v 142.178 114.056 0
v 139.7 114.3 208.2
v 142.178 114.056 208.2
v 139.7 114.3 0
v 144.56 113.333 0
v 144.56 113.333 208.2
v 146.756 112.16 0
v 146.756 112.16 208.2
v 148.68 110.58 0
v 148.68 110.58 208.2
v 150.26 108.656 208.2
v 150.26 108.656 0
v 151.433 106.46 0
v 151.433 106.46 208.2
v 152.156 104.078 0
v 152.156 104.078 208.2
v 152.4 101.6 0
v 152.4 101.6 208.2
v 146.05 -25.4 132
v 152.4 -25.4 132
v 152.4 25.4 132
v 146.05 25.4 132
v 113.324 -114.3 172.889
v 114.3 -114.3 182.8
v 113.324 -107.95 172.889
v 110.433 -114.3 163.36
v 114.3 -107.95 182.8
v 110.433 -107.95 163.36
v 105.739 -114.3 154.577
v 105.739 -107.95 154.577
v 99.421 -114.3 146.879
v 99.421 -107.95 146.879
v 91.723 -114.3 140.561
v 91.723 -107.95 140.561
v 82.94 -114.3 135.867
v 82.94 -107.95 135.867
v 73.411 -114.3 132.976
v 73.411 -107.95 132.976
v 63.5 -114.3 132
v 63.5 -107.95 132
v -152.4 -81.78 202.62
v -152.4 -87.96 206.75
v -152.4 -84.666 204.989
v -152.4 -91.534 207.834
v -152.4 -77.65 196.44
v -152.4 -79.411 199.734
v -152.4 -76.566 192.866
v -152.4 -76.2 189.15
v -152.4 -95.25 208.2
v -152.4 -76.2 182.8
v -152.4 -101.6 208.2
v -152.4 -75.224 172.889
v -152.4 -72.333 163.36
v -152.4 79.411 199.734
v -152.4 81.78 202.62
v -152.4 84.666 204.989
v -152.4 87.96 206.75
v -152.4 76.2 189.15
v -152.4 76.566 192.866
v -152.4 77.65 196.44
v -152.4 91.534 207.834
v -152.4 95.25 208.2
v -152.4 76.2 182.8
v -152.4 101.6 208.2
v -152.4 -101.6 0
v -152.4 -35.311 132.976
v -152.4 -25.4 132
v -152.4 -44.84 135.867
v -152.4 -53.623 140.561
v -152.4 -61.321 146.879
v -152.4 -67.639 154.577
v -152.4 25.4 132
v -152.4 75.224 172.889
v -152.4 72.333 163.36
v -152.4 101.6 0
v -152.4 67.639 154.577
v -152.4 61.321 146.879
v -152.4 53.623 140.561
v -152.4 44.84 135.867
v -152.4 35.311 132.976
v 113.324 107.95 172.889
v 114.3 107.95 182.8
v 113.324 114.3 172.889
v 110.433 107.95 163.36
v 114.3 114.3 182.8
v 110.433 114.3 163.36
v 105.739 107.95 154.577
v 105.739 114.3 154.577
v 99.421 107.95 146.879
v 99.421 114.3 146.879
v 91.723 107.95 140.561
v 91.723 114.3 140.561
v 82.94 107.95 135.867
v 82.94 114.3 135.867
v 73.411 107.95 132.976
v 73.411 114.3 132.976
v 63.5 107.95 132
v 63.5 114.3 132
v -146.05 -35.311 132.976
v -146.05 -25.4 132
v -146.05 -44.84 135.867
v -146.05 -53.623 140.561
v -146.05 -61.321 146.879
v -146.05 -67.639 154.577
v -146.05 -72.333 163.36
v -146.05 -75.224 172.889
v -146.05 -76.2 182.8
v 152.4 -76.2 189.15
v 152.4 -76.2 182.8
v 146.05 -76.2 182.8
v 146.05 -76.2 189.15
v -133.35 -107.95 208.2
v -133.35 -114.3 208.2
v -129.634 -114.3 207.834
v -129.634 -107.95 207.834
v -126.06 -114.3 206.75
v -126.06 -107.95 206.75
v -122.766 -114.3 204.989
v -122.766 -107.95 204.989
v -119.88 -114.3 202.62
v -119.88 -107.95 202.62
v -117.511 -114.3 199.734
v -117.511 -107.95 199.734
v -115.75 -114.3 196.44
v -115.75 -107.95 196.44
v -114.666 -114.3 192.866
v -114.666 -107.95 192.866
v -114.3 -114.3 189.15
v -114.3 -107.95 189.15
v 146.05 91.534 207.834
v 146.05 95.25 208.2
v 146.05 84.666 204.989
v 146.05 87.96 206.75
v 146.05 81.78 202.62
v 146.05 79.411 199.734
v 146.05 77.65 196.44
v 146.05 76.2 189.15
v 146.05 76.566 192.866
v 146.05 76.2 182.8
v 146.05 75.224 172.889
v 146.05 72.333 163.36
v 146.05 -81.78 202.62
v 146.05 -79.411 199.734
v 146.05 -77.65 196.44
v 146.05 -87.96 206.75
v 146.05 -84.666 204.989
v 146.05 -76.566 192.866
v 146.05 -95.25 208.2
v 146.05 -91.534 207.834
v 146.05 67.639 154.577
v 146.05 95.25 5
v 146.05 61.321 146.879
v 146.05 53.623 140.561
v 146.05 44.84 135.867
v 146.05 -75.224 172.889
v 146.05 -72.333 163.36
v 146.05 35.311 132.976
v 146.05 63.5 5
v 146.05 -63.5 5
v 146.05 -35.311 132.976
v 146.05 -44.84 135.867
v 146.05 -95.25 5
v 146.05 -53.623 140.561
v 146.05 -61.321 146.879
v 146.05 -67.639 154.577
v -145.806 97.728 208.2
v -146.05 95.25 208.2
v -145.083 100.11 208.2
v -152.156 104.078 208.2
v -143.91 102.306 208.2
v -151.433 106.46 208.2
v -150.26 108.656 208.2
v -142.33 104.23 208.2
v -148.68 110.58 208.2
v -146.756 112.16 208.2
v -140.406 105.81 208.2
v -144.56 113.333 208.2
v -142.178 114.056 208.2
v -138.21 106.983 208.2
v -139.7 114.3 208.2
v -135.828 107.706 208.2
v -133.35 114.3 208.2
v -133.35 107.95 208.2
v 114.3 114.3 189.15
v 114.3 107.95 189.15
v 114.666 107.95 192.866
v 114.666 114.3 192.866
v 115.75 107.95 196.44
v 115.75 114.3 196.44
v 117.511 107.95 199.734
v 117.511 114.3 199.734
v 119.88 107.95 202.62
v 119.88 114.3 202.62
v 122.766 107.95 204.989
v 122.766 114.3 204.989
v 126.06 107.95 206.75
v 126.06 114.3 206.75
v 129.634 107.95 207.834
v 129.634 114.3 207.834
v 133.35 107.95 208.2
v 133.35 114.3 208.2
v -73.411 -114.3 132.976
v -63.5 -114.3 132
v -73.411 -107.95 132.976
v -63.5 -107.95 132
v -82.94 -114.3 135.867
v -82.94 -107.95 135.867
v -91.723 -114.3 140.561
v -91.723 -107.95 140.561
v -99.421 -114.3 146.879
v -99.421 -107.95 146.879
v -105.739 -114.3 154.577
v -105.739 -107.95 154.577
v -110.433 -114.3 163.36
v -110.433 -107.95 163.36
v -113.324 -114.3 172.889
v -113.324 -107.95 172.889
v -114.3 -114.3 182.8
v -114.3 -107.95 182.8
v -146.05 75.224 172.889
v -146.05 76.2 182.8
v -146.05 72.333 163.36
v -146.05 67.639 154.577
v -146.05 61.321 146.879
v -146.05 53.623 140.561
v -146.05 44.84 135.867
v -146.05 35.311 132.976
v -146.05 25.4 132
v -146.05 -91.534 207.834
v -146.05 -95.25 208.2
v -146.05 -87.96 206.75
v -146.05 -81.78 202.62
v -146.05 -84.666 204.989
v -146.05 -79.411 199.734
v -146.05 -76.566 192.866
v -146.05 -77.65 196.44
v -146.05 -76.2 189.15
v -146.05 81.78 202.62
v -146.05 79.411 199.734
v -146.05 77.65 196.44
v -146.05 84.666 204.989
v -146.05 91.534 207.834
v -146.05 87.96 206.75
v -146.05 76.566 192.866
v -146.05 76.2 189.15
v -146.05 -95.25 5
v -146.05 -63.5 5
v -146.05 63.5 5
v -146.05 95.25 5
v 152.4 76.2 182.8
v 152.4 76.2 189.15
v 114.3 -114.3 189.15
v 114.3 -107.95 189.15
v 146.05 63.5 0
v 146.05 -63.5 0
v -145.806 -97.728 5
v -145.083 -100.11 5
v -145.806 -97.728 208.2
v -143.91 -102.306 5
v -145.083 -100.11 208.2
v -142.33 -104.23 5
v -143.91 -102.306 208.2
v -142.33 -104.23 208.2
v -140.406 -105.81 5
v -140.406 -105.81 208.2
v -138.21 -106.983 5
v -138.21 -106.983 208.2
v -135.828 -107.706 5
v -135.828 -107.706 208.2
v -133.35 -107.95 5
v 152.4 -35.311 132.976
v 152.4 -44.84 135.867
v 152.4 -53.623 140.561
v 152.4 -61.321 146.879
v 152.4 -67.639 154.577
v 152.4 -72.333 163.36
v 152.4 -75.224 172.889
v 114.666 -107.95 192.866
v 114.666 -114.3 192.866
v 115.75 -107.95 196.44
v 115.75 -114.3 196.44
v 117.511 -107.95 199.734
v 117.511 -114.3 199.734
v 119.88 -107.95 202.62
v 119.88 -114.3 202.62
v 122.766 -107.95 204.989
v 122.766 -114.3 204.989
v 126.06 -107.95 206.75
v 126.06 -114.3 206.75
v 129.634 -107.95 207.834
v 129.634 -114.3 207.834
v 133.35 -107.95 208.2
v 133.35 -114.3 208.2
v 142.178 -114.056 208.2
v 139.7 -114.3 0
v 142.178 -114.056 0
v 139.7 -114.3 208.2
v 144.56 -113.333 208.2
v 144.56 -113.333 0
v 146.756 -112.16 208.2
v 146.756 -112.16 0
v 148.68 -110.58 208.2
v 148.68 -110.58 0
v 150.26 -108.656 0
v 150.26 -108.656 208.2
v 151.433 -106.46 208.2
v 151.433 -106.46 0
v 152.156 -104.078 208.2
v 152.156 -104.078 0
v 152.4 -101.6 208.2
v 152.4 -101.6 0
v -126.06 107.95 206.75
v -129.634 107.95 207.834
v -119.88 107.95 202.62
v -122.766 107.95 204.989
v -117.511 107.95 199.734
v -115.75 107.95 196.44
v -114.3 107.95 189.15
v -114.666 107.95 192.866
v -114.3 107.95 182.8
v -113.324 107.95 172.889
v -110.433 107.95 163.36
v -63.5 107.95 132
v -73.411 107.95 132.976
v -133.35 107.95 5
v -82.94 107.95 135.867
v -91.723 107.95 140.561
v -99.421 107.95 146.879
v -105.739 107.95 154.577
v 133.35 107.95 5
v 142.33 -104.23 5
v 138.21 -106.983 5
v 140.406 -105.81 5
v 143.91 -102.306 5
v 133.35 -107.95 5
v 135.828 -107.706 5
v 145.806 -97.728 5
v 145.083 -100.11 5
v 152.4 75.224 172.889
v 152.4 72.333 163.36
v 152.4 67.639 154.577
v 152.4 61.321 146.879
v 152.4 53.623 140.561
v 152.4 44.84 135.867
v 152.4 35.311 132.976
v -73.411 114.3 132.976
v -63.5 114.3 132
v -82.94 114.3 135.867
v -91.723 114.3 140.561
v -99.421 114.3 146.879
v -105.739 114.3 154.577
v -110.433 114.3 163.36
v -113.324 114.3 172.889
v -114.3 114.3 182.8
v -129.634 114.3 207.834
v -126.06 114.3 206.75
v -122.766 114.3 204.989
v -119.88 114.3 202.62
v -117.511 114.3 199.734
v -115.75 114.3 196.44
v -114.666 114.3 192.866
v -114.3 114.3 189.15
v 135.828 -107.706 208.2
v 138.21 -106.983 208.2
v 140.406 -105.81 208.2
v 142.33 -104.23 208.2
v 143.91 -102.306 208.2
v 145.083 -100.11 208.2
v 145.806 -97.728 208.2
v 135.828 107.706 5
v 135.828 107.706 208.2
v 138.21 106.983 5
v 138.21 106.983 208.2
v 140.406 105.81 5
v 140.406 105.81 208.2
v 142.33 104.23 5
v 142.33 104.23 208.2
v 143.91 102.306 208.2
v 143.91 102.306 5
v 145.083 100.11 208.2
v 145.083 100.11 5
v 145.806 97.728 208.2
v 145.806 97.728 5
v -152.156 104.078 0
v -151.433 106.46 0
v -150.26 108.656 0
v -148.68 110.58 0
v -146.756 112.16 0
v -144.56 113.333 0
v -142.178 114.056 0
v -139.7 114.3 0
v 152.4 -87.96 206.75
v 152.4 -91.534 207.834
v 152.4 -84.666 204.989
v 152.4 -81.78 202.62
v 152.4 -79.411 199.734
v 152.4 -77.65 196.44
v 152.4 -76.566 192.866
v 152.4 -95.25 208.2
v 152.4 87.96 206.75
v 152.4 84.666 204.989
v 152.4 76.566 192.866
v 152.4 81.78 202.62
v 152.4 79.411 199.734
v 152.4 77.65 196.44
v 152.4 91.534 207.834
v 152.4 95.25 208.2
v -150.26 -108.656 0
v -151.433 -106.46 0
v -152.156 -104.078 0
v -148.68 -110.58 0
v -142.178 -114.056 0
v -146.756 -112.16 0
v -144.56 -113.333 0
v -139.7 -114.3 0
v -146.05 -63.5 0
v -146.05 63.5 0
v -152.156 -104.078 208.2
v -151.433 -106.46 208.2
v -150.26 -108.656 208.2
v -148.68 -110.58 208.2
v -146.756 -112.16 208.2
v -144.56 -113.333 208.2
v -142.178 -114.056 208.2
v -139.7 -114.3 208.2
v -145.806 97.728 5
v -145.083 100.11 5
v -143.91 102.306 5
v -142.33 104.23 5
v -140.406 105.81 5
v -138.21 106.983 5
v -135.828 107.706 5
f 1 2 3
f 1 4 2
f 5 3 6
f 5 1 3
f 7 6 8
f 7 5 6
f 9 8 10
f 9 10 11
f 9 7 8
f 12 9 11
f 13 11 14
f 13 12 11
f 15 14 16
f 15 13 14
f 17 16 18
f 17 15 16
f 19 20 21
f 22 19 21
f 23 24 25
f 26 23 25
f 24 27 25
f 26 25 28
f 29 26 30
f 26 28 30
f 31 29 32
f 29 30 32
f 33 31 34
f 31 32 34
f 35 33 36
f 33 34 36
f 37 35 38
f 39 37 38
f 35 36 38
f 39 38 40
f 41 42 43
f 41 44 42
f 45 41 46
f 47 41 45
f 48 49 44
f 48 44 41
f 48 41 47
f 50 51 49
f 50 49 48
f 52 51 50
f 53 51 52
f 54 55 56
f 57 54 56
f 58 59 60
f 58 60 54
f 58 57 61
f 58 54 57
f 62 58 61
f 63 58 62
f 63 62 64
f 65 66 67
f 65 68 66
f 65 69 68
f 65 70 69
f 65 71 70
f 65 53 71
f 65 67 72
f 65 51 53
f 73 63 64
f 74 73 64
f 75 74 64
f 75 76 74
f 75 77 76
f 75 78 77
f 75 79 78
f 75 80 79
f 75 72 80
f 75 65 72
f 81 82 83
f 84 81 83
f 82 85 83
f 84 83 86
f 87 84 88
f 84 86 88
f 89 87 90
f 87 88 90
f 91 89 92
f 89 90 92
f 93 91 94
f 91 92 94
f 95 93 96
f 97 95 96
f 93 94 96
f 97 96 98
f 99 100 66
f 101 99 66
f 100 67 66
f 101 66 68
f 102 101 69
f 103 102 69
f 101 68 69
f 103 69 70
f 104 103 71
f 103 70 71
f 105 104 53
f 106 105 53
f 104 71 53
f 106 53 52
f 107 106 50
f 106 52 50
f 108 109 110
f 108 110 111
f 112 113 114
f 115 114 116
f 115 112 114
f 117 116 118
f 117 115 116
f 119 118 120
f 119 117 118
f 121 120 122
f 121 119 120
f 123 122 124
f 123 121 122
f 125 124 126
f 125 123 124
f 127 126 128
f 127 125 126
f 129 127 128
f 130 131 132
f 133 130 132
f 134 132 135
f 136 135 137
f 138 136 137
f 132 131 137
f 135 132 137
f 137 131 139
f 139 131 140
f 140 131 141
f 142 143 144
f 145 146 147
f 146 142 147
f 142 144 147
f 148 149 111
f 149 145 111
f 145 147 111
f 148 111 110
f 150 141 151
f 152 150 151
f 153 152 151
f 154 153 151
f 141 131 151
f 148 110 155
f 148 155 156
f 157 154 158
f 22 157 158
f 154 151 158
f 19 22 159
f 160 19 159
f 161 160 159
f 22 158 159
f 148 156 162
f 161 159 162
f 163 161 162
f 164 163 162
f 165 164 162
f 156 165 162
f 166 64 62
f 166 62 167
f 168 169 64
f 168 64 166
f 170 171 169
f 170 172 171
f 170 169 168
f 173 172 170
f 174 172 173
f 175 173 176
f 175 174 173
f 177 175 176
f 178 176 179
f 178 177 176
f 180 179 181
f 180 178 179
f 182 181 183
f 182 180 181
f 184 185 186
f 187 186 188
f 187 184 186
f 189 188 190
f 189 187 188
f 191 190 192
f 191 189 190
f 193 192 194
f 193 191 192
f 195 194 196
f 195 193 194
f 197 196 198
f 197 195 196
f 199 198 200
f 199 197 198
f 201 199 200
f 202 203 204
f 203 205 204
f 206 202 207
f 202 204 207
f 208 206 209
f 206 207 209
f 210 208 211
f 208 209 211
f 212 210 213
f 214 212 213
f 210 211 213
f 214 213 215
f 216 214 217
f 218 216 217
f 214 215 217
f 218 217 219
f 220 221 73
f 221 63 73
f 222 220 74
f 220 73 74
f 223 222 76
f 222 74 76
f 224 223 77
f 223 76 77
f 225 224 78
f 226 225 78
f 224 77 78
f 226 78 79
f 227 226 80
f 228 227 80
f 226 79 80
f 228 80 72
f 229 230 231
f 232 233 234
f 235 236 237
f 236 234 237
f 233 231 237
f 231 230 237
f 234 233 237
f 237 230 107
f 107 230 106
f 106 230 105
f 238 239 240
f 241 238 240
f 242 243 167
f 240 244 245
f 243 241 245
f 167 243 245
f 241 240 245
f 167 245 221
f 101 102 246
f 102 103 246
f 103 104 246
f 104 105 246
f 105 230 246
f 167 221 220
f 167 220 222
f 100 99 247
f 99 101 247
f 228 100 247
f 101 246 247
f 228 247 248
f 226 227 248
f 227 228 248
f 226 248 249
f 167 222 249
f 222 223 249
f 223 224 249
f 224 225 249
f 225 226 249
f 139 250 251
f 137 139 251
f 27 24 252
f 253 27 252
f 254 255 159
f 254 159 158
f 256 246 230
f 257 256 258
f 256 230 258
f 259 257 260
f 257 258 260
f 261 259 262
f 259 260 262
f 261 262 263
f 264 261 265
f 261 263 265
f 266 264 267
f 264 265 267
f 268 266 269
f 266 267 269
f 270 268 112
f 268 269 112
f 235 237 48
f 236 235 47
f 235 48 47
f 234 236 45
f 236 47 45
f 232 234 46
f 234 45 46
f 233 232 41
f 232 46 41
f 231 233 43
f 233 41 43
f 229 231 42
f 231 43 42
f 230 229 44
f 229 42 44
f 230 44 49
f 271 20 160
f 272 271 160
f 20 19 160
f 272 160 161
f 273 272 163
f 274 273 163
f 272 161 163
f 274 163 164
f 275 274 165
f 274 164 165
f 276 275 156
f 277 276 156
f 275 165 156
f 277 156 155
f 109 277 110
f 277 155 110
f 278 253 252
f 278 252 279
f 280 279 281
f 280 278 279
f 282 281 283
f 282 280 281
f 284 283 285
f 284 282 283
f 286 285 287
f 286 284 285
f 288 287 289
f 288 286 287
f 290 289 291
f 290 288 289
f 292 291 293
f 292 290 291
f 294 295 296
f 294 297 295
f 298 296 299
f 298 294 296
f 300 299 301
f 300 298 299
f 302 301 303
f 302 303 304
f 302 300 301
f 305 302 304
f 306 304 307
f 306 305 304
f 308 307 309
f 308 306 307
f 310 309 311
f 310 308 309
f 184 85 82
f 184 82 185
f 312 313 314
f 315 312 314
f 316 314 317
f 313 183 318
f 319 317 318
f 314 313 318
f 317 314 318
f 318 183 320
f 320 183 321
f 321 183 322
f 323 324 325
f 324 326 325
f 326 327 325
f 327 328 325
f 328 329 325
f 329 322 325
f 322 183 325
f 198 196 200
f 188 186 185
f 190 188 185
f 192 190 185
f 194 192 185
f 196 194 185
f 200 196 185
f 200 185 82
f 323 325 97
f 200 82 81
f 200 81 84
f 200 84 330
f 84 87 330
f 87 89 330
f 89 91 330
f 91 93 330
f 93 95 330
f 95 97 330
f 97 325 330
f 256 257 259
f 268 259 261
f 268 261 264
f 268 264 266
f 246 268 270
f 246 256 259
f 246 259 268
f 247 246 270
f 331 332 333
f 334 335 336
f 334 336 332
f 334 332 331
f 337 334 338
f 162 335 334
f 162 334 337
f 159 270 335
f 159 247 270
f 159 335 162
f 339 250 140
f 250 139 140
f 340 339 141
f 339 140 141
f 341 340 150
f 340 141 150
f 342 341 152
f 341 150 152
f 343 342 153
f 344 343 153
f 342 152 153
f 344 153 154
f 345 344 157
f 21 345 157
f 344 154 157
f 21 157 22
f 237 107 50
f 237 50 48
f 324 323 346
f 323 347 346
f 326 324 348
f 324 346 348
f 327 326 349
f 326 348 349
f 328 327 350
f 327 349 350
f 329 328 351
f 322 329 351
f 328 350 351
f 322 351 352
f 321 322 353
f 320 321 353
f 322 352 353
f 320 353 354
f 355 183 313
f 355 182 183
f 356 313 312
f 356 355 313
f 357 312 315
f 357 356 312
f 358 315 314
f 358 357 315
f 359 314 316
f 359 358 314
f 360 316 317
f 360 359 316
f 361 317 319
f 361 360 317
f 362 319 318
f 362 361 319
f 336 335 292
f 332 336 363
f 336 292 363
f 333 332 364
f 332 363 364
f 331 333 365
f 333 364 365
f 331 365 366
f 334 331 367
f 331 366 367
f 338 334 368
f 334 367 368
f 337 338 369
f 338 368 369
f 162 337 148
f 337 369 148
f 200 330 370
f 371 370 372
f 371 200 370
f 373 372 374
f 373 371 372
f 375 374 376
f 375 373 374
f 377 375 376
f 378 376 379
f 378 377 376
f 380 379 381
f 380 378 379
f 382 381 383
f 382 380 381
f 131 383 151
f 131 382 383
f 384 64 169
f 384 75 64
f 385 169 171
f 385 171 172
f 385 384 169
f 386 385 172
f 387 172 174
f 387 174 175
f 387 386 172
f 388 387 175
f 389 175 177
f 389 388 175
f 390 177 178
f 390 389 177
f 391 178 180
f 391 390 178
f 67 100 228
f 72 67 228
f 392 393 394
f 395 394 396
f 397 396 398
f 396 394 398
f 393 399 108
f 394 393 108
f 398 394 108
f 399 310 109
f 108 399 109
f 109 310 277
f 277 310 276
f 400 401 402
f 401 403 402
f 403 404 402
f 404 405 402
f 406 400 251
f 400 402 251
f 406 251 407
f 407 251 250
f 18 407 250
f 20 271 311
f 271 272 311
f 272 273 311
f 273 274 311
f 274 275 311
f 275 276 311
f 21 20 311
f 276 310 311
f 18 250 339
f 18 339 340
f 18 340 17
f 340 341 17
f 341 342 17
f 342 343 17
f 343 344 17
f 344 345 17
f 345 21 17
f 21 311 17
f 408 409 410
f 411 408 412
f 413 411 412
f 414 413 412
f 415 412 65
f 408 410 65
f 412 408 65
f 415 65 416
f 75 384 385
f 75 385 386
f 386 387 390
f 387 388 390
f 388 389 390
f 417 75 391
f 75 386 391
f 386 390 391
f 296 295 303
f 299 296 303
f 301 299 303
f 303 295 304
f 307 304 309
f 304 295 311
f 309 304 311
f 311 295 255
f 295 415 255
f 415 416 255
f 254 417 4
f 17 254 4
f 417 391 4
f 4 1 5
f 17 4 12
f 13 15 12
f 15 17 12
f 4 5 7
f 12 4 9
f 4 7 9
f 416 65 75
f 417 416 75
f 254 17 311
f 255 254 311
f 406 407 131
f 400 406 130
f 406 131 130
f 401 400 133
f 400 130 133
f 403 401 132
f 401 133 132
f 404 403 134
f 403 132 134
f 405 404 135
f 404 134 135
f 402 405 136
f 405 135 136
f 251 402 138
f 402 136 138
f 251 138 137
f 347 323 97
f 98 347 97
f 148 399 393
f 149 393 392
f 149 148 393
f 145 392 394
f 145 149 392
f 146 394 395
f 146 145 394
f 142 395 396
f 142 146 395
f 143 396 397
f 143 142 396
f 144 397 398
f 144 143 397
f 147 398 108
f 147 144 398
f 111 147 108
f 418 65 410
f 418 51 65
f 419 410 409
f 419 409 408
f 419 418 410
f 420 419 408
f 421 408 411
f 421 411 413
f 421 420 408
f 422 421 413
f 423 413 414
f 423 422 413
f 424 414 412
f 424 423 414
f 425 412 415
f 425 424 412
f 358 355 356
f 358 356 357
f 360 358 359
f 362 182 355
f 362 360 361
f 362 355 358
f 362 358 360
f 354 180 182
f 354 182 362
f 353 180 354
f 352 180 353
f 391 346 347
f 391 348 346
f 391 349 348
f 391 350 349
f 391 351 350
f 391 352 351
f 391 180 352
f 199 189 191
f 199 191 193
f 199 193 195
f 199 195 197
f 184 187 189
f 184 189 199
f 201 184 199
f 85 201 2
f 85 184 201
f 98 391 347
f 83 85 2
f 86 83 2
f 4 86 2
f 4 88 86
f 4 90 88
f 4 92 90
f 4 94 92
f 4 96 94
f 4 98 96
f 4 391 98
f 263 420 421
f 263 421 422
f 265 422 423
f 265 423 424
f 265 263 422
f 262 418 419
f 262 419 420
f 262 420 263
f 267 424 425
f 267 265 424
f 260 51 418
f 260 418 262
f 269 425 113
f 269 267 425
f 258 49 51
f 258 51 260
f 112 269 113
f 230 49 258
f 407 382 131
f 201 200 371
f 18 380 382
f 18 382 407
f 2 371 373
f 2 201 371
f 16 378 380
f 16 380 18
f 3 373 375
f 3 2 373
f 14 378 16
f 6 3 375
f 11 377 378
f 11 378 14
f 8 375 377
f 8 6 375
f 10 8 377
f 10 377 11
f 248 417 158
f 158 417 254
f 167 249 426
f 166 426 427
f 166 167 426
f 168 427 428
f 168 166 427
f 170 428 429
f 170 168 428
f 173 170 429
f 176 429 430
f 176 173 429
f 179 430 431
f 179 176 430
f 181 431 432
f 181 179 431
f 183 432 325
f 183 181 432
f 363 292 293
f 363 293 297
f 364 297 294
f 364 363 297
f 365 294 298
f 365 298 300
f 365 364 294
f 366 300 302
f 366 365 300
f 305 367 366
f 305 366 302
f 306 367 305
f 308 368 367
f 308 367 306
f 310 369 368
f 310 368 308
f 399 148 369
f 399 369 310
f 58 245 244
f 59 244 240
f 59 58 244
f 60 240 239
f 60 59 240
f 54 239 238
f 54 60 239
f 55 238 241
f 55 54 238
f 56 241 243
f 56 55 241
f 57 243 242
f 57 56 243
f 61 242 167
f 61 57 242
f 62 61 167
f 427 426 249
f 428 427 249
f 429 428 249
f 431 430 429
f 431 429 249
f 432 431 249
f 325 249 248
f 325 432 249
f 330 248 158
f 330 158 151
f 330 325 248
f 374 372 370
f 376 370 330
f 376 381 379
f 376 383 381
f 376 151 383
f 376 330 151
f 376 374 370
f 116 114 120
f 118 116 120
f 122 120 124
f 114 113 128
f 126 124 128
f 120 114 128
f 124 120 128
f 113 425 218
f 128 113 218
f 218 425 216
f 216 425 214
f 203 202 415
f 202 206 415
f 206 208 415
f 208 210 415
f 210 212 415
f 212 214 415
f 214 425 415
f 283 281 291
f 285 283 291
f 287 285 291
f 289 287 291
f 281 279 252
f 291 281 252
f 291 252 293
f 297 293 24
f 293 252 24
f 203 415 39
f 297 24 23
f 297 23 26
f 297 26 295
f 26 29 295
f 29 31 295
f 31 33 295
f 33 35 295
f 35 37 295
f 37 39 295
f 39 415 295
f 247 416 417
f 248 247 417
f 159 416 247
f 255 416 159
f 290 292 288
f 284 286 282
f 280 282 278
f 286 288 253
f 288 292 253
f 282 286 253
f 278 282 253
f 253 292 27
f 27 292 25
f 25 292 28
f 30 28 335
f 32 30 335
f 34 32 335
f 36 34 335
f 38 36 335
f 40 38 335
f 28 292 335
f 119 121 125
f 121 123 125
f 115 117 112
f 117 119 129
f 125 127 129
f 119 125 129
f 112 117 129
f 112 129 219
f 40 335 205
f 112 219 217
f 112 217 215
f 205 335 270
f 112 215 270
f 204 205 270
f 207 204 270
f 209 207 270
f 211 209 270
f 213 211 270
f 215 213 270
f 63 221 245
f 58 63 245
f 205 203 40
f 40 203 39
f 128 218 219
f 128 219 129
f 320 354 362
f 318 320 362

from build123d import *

# Parameters (mm, degrees)
F0_W     = 304.8
F0_H     = 228.6
F0_W_2   = 292.1
F0_H_2   = 127
F1_DEPTH = 5
F2_W     = 304.8
F2_H     = 228.6
F3_DEPTH = 203.2
F4_W     = 228.6
F4_H     = 76.2
F5_DEPTH = 228.601
F6_W     = 152.4
F6_H     = 76.2
F7_DEPTH = 304.801
F8_R     = 50.8
F9_R     = 19.05
F10_R    = 12.7


with BuildPart() as f1:
    # F0 (on Top) → F1 (new body)
    with BuildSketch(Plane.XY):
        Rectangle(F0_W, F0_H)
        Rectangle(F0_W_2, F0_H_2, mode=Mode.SUBTRACT)
    extrude(amount=F1_DEPTH)

    # F2 (on face) → F3 (join)
    with BuildSketch(Plane.XY.offset(5)):
        Rectangle(F2_W, F2_H)
        Polygon((-146.0499983072, 63.5), (-146.0499983072, 107.9499983072), (146.0499983072, 107.9499983072), (146.0499983072, 63.5), (146.0499983072, -63.5), (146.0499983072, -107.9499983072), (-146.0499983072, -107.9499983072), (-146.0499983072, -63.5), align=None, mode=Mode.SUBTRACT)
    extrude(amount=F3_DEPTH)

    # F4 (on face) → F5 (cut, through all)
    with BuildSketch(Plane.XZ.offset(114.3)):
        with Locations((0, 170.1)):
            Rectangle(F4_W, F4_H)
    extrude(amount=-F5_DEPTH, mode=Mode.SUBTRACT)

    # F6 (on face) → F7 (cut, through all)
    with BuildSketch(Plane.YZ.offset(152.4)):
        with Locations((0, 170.1)):
            Rectangle(F6_W, F6_H)
    extrude(amount=-F7_DEPTH, mode=Mode.SUBTRACT)

    # F8
    f8_edges = [f1.edges().sort_by_distance(p)[0] for p in [
        (-114.3, -111.124999, 132),
        (-149.224999, 76.2, 132),
        (-114.3, 111.124999, 132),
        (-149.224999, -76.2, 132),
        (114.3, 111.124999, 132),
        (149.224999, -76.2, 132),
        (114.3, -111.124999, 132),
        (149.224999, 76.2, 132),
    ]]
    fillet(f8_edges, radius=F8_R)

    # F9
    f9_edges = [f1.edges().sort_by_distance(p)[0] for p in [
        (149.224999, 76.2, 208.2),
        (114.3, 111.124999, 208.2),
        (-114.3, 111.124999, 208.2),
        (-149.224999, 76.2, 208.2),
        (-149.224999, -76.2, 208.2),
        (-114.3, -111.124999, 208.2),
        (114.3, -111.124999, 208.2),
        (149.224999, -76.2, 208.2),
    ]]
    fillet(f9_edges, radius=F9_R)

    # F10
    f10_edges = [f1.edges().sort_by_distance(p)[0] for p in [
        (152.4, -114.3, 104.1),
        (146.049998, -107.949998, 106.6),
        (-152.4, -114.3, 104.1),
        (146.049998, 107.949998, 106.6),
        (-146.049998, 107.949998, 106.6),
        (-146.049998, -107.949998, 106.6),
        (-152.4, 114.3, 104.1),
        (152.4, 114.3, 104.1),
    ]]
    fillet(f10_edges, radius=F10_R)


solid = f1.part
